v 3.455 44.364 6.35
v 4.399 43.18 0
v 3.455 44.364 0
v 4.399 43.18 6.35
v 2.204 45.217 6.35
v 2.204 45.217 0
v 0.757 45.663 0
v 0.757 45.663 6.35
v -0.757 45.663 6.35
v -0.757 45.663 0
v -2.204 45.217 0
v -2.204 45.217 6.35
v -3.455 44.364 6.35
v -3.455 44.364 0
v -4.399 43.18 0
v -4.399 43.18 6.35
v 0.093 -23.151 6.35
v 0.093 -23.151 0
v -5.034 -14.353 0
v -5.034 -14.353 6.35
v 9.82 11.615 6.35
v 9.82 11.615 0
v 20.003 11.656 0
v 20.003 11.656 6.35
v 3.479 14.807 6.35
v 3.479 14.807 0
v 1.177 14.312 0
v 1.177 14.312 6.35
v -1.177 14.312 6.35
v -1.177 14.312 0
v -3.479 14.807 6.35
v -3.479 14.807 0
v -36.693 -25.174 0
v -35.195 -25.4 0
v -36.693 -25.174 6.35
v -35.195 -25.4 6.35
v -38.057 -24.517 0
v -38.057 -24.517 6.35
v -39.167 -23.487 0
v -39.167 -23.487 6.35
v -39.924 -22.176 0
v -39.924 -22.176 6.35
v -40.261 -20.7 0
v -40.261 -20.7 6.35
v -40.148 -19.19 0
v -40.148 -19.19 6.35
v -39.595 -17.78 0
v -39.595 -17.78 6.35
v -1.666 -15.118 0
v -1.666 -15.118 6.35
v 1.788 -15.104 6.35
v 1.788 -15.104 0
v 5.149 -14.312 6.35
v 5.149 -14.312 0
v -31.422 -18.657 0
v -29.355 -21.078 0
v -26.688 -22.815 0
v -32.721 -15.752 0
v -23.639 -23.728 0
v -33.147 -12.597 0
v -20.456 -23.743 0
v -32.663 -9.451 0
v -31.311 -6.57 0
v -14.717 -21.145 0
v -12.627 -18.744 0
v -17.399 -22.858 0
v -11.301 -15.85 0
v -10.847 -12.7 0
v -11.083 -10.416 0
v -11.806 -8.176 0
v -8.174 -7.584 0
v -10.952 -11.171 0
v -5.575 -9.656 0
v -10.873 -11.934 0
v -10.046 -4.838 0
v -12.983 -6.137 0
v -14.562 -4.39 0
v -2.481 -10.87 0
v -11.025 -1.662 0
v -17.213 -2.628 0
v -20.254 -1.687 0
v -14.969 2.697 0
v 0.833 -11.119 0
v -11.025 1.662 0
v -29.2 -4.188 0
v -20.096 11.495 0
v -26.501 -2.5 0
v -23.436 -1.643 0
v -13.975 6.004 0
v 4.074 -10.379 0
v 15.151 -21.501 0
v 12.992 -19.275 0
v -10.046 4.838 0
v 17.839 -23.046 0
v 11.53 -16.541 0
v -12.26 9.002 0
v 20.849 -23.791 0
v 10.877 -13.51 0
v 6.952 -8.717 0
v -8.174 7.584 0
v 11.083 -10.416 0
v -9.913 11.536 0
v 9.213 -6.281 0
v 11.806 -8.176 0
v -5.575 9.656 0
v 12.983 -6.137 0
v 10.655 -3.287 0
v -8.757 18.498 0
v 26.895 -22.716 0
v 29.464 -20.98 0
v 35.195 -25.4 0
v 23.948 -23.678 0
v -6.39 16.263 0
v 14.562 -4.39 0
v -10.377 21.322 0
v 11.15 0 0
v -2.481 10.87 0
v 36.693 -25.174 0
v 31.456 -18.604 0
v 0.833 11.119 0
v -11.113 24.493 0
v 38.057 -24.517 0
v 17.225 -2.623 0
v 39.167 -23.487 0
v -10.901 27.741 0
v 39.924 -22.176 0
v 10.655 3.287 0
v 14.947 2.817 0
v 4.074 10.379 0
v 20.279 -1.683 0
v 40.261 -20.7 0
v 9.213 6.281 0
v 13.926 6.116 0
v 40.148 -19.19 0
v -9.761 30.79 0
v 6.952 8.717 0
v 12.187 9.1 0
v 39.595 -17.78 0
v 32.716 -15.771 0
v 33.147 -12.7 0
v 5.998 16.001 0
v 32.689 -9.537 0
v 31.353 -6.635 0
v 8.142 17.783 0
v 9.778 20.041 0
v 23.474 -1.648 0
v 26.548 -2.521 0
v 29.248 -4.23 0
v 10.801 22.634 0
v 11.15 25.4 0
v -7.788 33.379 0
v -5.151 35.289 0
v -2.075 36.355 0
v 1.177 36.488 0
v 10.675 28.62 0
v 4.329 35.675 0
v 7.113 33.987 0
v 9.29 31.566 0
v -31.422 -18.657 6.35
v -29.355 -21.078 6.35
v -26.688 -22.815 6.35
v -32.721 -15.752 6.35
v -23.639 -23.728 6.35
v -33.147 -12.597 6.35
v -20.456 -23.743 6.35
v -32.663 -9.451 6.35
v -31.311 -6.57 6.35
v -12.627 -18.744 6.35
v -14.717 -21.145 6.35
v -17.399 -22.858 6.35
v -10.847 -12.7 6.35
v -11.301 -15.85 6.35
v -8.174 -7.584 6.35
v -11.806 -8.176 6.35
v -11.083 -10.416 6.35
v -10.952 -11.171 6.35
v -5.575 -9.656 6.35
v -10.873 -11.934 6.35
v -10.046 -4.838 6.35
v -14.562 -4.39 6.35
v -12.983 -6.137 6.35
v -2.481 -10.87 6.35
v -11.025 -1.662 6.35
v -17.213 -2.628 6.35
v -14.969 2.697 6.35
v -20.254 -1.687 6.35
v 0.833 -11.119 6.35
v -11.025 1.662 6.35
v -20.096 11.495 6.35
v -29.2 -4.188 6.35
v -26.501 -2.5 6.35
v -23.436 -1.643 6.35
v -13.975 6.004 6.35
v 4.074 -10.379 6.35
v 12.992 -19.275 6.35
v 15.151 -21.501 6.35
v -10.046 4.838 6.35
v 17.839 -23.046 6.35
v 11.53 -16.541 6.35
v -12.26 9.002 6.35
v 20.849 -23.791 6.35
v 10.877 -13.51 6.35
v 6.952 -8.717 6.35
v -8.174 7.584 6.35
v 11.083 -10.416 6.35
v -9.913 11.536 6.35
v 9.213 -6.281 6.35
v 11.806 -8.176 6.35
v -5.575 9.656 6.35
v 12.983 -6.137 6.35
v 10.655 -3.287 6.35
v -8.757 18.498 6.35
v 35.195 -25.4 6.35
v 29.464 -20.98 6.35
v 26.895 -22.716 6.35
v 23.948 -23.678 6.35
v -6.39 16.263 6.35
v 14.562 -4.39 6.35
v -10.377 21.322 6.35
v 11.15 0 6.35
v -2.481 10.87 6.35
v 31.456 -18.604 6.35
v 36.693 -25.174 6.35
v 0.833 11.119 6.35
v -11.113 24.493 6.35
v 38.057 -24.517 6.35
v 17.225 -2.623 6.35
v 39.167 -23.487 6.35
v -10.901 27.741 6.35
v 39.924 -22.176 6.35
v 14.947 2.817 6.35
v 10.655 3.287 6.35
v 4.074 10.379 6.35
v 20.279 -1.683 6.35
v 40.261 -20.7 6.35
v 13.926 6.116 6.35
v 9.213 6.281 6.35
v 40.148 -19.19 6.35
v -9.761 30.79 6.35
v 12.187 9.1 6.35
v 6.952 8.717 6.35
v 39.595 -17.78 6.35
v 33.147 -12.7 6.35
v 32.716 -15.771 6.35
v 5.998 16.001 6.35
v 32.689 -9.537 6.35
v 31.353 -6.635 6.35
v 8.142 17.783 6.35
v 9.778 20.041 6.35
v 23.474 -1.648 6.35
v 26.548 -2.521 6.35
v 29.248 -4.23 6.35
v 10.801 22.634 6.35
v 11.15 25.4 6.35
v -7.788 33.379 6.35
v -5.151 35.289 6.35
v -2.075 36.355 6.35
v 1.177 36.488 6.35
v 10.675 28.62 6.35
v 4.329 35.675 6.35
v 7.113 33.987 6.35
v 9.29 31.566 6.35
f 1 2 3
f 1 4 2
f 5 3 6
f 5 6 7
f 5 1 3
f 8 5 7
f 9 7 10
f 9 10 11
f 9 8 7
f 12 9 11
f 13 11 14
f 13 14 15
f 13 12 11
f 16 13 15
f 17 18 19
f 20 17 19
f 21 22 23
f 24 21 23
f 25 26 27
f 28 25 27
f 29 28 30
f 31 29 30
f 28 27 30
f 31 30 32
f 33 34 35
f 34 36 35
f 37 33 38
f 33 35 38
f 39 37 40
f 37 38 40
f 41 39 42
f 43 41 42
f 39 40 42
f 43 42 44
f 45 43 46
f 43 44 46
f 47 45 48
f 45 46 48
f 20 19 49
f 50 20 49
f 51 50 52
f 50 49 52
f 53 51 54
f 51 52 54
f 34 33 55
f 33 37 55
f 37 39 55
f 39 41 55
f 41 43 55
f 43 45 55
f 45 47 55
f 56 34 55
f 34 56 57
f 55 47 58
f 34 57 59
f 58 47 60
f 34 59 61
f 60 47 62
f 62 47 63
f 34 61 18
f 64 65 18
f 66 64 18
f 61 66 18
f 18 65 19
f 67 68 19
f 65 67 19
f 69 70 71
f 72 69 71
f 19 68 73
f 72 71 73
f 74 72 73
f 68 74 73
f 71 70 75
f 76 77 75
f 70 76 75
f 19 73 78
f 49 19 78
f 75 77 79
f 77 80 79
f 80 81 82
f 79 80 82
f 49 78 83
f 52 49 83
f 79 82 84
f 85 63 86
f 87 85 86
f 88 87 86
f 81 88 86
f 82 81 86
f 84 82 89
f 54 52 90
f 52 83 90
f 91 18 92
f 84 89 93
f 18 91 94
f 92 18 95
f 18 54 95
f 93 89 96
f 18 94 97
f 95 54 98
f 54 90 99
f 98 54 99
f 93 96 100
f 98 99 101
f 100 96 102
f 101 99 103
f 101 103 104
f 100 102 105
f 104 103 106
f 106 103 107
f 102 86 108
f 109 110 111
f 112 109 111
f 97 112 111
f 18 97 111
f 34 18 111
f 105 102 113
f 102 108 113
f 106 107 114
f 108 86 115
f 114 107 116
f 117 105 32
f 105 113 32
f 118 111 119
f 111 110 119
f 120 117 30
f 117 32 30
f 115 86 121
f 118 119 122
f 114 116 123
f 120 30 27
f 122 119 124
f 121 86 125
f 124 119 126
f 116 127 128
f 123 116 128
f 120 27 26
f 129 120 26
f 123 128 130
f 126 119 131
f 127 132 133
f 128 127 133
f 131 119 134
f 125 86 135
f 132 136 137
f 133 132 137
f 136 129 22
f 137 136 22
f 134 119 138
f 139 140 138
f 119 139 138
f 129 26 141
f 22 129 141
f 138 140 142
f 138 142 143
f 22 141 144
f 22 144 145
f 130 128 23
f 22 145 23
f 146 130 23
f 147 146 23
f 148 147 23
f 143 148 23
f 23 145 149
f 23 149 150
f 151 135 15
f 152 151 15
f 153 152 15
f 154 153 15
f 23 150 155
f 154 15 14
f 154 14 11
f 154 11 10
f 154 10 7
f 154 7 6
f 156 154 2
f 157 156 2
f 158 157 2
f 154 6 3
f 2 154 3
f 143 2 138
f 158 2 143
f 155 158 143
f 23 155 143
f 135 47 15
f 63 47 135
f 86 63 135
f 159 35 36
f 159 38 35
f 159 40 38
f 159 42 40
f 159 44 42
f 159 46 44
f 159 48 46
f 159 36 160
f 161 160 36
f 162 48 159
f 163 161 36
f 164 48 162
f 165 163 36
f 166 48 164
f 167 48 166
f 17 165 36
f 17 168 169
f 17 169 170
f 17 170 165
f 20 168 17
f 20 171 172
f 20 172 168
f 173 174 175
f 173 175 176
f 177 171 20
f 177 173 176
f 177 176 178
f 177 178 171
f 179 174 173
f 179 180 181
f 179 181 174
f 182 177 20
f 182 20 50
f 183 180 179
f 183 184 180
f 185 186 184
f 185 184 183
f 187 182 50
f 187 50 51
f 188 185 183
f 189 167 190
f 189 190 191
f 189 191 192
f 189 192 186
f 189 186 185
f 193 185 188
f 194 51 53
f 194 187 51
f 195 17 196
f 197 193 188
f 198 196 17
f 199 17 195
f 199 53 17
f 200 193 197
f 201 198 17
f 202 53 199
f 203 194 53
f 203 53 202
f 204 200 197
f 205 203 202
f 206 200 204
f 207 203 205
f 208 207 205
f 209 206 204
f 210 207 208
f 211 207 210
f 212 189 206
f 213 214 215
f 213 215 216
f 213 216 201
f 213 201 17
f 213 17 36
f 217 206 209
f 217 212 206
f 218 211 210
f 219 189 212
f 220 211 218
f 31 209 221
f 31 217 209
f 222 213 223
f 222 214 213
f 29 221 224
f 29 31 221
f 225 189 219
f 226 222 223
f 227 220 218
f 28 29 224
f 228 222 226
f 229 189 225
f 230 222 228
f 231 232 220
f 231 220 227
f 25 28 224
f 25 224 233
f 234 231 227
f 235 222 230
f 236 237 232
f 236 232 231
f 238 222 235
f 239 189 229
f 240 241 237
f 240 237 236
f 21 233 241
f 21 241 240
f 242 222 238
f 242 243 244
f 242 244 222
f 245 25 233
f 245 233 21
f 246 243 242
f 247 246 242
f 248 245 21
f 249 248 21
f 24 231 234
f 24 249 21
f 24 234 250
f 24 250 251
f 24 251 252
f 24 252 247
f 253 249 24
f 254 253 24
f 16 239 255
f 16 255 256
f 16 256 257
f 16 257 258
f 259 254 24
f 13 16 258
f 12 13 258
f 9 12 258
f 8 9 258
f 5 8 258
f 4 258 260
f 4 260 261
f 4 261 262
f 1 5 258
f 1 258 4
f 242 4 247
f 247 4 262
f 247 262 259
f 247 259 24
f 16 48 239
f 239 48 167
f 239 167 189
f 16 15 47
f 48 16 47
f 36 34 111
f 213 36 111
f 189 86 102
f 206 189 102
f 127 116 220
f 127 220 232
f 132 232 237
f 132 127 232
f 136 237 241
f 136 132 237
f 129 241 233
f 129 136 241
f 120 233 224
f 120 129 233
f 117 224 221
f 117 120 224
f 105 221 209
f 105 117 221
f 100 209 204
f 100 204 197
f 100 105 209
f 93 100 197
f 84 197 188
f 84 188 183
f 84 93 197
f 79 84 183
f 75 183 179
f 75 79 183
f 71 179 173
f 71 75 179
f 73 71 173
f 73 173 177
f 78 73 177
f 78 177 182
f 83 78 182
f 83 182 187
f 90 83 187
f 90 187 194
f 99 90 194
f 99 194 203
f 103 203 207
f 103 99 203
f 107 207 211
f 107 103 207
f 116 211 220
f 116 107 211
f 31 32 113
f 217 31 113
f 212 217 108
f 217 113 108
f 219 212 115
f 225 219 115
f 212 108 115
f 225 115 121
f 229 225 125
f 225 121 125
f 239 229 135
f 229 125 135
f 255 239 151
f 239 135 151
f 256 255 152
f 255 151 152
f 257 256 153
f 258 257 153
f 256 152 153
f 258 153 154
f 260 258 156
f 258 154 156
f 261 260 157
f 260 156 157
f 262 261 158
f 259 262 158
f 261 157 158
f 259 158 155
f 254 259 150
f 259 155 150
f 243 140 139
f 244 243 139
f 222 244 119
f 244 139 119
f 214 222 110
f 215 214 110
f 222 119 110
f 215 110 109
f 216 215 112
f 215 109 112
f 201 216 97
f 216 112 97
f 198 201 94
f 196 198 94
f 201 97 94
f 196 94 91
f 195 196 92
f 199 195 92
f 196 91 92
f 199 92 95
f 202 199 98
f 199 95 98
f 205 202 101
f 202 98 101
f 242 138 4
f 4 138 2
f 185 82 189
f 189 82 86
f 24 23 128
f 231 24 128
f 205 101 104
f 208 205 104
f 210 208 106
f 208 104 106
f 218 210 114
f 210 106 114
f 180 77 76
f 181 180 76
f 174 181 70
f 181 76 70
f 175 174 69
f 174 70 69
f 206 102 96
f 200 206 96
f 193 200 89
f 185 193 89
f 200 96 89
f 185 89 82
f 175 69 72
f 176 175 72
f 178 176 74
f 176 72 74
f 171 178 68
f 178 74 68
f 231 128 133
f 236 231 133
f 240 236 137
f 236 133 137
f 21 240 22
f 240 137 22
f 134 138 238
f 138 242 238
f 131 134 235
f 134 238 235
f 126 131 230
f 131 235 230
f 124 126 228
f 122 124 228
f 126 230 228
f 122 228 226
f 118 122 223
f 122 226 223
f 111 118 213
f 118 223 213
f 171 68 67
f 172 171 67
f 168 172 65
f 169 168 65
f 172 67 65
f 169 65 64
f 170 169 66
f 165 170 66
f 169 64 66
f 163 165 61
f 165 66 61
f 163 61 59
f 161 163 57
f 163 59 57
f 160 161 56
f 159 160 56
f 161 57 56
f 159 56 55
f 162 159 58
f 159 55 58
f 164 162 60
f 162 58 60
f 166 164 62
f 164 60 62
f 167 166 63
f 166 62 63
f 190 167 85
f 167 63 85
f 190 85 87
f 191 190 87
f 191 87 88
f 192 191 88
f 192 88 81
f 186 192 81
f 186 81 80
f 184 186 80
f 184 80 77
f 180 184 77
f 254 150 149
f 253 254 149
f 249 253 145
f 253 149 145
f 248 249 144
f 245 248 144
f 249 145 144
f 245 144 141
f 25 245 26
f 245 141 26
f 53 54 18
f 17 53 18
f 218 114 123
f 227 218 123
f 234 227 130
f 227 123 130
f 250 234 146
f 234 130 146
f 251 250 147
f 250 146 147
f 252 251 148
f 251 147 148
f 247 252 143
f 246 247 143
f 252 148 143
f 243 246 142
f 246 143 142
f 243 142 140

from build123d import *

# Parameters (mm, degrees)
F1_DEPTH = 6.35
F0_R     = 11.15
F2_DEPTH = 6.35
F3_R     = 5.08


with BuildPart() as f1:
    # F0 (on Top) → F1 (new body)
    with BuildSketch(Plane.XY):
        Polygon((43.994091, -25.4), (0, 50.8), (-43.994091, -25.4), align=None)
        with BuildLine():
            ThreePointArc((-3.478961, 14.806637), (-6.539575, 34.430861), (11.15, 25.4))
            ThreePointArc((11.15, 25.4), (9.030861, 18.860425), (3.478961, 14.806637))
            ThreePointArc((3.478961, 14.806637), (6.838188, 13.58598), (9.819816, 11.615115))
            Line((9.819816, 11.615115), (20.002501, 11.656133))
            Line((20.002501, 11.656133), (14.946682, 2.81716))
            ThreePointArc((14.946682, 2.81716), (15.143919, 1.414713), (15.209855, 0))
            ThreePointArc((15.209855, 0), (15.047122, -2.218966), (14.562405, -4.39045))
            ThreePointArc((14.562405, -4.39045), (26.548213, -2.521131), (33.147045, -12.7))
            ThreePointArc((33.147045, -12.7), (20.849038, -23.790743), (11.083444, -10.416187))
            ThreePointArc((11.083444, -10.416187), (8.34671, -12.715035), (5.149077, -14.311768))
            Line((5.149077, -14.311768), (0.093257, -23.150741))
            Line((0.093257, -23.150741), (-5.033608, -14.352786))
            ThreePointArc((-5.033608, -14.352786), (-8.295423, -12.748554), (-11.083444, -10.416187))
            ThreePointArc((-11.083444, -10.416187), (-10.906302, -11.551993), (-10.847045, -12.7))
            ThreePointArc((-10.847045, -12.7), (-32.175914, -17.251168), (-14.562405, -4.39045))
            ThreePointArc((-14.562405, -4.39045), (-15.184898, -0.870945), (-14.968893, 2.696653))
            Line((-14.968893, 2.696653), (-20.095758, 11.494607))
            Line((-20.095758, 11.494607), (-9.913073, 11.535626))
            ThreePointArc((-9.913073, 11.535626), (-6.89286, 13.558324), (-3.478961, 14.806637))
        make_face(mode=Mode.SUBTRACT)
    extrude(amount=F1_DEPTH)

    # F0 (on Top) → F2 (join)
    with BuildSketch(Plane.XY):
        with BuildLine():
            ThreePointArc((15.209855, 0), (15.143919, 1.414713), (14.946682, 2.81716))
            Line((14.946682, 2.81716), (5.149077, -14.311768))
            ThreePointArc((5.149077, -14.311768), (8.34671, -12.715035), (11.083444, -10.416187))
            ThreePointArc((11.083444, -10.416187), (12.340862, -7.125), (14.562405, -4.39045))
            ThreePointArc((14.562405, -4.39045), (15.047122, -2.218966), (15.209855, 0))
        make_face()
        with BuildLine():
            ThreePointArc((3.478961, 14.806637), (0, 14.25), (-3.478961, 14.806637))
            ThreePointArc((-3.478961, 14.806637), (-6.89286, 13.558324), (-9.913073, 11.535626))
            Line((-9.913073, 11.535626), (9.819816, 11.615115))
            ThreePointArc((9.819816, 11.615115), (6.838188, 13.58598), (3.478961, 14.806637))
        make_face()
        with BuildLine():
            Line((-5.033608, -14.352786), (-14.968893, 2.696653))
            ThreePointArc((-14.968893, 2.696653), (-15.184898, -0.870945), (-14.562405, -4.39045))
            ThreePointArc((-14.562405, -4.39045), (-12.340862, -7.125), (-11.083444, -10.416187))
            ThreePointArc((-11.083444, -10.416187), (-8.295423, -12.748554), (-5.033608, -14.352786))
        make_face()
        with BuildLine():
            Line((9.819816, 11.615115), (-9.913073, 11.535626))
            ThreePointArc((-9.913073, 11.535626), (-13.202648, 7.551805), (-14.968893, 2.696653))
            Line((-14.968893, 2.696653), (-5.033608, -14.352786))
            ThreePointArc((-5.033608, -14.352786), (0.061269, -15.209731), (5.149077, -14.311768))
            Line((5.149077, -14.311768), (14.946682, 2.81716))
            ThreePointArc((14.946682, 2.81716), (13.141379, 7.657926), (9.819816, 11.615115))
        make_face()
        Circle(F0_R, mode=Mode.SUBTRACT)
    extrude(amount=F2_DEPTH)

    # F3
    f3_edges = [f1.edges().sort_by_distance(p)[0] for p in [
        (0, 50.8, 3.175),
        (43.994091, -25.4, 3.175),
        (-43.994091, -25.4, 3.175),
    ]]
    fillet(f3_edges, radius=F3_R)


solid = f1.part
